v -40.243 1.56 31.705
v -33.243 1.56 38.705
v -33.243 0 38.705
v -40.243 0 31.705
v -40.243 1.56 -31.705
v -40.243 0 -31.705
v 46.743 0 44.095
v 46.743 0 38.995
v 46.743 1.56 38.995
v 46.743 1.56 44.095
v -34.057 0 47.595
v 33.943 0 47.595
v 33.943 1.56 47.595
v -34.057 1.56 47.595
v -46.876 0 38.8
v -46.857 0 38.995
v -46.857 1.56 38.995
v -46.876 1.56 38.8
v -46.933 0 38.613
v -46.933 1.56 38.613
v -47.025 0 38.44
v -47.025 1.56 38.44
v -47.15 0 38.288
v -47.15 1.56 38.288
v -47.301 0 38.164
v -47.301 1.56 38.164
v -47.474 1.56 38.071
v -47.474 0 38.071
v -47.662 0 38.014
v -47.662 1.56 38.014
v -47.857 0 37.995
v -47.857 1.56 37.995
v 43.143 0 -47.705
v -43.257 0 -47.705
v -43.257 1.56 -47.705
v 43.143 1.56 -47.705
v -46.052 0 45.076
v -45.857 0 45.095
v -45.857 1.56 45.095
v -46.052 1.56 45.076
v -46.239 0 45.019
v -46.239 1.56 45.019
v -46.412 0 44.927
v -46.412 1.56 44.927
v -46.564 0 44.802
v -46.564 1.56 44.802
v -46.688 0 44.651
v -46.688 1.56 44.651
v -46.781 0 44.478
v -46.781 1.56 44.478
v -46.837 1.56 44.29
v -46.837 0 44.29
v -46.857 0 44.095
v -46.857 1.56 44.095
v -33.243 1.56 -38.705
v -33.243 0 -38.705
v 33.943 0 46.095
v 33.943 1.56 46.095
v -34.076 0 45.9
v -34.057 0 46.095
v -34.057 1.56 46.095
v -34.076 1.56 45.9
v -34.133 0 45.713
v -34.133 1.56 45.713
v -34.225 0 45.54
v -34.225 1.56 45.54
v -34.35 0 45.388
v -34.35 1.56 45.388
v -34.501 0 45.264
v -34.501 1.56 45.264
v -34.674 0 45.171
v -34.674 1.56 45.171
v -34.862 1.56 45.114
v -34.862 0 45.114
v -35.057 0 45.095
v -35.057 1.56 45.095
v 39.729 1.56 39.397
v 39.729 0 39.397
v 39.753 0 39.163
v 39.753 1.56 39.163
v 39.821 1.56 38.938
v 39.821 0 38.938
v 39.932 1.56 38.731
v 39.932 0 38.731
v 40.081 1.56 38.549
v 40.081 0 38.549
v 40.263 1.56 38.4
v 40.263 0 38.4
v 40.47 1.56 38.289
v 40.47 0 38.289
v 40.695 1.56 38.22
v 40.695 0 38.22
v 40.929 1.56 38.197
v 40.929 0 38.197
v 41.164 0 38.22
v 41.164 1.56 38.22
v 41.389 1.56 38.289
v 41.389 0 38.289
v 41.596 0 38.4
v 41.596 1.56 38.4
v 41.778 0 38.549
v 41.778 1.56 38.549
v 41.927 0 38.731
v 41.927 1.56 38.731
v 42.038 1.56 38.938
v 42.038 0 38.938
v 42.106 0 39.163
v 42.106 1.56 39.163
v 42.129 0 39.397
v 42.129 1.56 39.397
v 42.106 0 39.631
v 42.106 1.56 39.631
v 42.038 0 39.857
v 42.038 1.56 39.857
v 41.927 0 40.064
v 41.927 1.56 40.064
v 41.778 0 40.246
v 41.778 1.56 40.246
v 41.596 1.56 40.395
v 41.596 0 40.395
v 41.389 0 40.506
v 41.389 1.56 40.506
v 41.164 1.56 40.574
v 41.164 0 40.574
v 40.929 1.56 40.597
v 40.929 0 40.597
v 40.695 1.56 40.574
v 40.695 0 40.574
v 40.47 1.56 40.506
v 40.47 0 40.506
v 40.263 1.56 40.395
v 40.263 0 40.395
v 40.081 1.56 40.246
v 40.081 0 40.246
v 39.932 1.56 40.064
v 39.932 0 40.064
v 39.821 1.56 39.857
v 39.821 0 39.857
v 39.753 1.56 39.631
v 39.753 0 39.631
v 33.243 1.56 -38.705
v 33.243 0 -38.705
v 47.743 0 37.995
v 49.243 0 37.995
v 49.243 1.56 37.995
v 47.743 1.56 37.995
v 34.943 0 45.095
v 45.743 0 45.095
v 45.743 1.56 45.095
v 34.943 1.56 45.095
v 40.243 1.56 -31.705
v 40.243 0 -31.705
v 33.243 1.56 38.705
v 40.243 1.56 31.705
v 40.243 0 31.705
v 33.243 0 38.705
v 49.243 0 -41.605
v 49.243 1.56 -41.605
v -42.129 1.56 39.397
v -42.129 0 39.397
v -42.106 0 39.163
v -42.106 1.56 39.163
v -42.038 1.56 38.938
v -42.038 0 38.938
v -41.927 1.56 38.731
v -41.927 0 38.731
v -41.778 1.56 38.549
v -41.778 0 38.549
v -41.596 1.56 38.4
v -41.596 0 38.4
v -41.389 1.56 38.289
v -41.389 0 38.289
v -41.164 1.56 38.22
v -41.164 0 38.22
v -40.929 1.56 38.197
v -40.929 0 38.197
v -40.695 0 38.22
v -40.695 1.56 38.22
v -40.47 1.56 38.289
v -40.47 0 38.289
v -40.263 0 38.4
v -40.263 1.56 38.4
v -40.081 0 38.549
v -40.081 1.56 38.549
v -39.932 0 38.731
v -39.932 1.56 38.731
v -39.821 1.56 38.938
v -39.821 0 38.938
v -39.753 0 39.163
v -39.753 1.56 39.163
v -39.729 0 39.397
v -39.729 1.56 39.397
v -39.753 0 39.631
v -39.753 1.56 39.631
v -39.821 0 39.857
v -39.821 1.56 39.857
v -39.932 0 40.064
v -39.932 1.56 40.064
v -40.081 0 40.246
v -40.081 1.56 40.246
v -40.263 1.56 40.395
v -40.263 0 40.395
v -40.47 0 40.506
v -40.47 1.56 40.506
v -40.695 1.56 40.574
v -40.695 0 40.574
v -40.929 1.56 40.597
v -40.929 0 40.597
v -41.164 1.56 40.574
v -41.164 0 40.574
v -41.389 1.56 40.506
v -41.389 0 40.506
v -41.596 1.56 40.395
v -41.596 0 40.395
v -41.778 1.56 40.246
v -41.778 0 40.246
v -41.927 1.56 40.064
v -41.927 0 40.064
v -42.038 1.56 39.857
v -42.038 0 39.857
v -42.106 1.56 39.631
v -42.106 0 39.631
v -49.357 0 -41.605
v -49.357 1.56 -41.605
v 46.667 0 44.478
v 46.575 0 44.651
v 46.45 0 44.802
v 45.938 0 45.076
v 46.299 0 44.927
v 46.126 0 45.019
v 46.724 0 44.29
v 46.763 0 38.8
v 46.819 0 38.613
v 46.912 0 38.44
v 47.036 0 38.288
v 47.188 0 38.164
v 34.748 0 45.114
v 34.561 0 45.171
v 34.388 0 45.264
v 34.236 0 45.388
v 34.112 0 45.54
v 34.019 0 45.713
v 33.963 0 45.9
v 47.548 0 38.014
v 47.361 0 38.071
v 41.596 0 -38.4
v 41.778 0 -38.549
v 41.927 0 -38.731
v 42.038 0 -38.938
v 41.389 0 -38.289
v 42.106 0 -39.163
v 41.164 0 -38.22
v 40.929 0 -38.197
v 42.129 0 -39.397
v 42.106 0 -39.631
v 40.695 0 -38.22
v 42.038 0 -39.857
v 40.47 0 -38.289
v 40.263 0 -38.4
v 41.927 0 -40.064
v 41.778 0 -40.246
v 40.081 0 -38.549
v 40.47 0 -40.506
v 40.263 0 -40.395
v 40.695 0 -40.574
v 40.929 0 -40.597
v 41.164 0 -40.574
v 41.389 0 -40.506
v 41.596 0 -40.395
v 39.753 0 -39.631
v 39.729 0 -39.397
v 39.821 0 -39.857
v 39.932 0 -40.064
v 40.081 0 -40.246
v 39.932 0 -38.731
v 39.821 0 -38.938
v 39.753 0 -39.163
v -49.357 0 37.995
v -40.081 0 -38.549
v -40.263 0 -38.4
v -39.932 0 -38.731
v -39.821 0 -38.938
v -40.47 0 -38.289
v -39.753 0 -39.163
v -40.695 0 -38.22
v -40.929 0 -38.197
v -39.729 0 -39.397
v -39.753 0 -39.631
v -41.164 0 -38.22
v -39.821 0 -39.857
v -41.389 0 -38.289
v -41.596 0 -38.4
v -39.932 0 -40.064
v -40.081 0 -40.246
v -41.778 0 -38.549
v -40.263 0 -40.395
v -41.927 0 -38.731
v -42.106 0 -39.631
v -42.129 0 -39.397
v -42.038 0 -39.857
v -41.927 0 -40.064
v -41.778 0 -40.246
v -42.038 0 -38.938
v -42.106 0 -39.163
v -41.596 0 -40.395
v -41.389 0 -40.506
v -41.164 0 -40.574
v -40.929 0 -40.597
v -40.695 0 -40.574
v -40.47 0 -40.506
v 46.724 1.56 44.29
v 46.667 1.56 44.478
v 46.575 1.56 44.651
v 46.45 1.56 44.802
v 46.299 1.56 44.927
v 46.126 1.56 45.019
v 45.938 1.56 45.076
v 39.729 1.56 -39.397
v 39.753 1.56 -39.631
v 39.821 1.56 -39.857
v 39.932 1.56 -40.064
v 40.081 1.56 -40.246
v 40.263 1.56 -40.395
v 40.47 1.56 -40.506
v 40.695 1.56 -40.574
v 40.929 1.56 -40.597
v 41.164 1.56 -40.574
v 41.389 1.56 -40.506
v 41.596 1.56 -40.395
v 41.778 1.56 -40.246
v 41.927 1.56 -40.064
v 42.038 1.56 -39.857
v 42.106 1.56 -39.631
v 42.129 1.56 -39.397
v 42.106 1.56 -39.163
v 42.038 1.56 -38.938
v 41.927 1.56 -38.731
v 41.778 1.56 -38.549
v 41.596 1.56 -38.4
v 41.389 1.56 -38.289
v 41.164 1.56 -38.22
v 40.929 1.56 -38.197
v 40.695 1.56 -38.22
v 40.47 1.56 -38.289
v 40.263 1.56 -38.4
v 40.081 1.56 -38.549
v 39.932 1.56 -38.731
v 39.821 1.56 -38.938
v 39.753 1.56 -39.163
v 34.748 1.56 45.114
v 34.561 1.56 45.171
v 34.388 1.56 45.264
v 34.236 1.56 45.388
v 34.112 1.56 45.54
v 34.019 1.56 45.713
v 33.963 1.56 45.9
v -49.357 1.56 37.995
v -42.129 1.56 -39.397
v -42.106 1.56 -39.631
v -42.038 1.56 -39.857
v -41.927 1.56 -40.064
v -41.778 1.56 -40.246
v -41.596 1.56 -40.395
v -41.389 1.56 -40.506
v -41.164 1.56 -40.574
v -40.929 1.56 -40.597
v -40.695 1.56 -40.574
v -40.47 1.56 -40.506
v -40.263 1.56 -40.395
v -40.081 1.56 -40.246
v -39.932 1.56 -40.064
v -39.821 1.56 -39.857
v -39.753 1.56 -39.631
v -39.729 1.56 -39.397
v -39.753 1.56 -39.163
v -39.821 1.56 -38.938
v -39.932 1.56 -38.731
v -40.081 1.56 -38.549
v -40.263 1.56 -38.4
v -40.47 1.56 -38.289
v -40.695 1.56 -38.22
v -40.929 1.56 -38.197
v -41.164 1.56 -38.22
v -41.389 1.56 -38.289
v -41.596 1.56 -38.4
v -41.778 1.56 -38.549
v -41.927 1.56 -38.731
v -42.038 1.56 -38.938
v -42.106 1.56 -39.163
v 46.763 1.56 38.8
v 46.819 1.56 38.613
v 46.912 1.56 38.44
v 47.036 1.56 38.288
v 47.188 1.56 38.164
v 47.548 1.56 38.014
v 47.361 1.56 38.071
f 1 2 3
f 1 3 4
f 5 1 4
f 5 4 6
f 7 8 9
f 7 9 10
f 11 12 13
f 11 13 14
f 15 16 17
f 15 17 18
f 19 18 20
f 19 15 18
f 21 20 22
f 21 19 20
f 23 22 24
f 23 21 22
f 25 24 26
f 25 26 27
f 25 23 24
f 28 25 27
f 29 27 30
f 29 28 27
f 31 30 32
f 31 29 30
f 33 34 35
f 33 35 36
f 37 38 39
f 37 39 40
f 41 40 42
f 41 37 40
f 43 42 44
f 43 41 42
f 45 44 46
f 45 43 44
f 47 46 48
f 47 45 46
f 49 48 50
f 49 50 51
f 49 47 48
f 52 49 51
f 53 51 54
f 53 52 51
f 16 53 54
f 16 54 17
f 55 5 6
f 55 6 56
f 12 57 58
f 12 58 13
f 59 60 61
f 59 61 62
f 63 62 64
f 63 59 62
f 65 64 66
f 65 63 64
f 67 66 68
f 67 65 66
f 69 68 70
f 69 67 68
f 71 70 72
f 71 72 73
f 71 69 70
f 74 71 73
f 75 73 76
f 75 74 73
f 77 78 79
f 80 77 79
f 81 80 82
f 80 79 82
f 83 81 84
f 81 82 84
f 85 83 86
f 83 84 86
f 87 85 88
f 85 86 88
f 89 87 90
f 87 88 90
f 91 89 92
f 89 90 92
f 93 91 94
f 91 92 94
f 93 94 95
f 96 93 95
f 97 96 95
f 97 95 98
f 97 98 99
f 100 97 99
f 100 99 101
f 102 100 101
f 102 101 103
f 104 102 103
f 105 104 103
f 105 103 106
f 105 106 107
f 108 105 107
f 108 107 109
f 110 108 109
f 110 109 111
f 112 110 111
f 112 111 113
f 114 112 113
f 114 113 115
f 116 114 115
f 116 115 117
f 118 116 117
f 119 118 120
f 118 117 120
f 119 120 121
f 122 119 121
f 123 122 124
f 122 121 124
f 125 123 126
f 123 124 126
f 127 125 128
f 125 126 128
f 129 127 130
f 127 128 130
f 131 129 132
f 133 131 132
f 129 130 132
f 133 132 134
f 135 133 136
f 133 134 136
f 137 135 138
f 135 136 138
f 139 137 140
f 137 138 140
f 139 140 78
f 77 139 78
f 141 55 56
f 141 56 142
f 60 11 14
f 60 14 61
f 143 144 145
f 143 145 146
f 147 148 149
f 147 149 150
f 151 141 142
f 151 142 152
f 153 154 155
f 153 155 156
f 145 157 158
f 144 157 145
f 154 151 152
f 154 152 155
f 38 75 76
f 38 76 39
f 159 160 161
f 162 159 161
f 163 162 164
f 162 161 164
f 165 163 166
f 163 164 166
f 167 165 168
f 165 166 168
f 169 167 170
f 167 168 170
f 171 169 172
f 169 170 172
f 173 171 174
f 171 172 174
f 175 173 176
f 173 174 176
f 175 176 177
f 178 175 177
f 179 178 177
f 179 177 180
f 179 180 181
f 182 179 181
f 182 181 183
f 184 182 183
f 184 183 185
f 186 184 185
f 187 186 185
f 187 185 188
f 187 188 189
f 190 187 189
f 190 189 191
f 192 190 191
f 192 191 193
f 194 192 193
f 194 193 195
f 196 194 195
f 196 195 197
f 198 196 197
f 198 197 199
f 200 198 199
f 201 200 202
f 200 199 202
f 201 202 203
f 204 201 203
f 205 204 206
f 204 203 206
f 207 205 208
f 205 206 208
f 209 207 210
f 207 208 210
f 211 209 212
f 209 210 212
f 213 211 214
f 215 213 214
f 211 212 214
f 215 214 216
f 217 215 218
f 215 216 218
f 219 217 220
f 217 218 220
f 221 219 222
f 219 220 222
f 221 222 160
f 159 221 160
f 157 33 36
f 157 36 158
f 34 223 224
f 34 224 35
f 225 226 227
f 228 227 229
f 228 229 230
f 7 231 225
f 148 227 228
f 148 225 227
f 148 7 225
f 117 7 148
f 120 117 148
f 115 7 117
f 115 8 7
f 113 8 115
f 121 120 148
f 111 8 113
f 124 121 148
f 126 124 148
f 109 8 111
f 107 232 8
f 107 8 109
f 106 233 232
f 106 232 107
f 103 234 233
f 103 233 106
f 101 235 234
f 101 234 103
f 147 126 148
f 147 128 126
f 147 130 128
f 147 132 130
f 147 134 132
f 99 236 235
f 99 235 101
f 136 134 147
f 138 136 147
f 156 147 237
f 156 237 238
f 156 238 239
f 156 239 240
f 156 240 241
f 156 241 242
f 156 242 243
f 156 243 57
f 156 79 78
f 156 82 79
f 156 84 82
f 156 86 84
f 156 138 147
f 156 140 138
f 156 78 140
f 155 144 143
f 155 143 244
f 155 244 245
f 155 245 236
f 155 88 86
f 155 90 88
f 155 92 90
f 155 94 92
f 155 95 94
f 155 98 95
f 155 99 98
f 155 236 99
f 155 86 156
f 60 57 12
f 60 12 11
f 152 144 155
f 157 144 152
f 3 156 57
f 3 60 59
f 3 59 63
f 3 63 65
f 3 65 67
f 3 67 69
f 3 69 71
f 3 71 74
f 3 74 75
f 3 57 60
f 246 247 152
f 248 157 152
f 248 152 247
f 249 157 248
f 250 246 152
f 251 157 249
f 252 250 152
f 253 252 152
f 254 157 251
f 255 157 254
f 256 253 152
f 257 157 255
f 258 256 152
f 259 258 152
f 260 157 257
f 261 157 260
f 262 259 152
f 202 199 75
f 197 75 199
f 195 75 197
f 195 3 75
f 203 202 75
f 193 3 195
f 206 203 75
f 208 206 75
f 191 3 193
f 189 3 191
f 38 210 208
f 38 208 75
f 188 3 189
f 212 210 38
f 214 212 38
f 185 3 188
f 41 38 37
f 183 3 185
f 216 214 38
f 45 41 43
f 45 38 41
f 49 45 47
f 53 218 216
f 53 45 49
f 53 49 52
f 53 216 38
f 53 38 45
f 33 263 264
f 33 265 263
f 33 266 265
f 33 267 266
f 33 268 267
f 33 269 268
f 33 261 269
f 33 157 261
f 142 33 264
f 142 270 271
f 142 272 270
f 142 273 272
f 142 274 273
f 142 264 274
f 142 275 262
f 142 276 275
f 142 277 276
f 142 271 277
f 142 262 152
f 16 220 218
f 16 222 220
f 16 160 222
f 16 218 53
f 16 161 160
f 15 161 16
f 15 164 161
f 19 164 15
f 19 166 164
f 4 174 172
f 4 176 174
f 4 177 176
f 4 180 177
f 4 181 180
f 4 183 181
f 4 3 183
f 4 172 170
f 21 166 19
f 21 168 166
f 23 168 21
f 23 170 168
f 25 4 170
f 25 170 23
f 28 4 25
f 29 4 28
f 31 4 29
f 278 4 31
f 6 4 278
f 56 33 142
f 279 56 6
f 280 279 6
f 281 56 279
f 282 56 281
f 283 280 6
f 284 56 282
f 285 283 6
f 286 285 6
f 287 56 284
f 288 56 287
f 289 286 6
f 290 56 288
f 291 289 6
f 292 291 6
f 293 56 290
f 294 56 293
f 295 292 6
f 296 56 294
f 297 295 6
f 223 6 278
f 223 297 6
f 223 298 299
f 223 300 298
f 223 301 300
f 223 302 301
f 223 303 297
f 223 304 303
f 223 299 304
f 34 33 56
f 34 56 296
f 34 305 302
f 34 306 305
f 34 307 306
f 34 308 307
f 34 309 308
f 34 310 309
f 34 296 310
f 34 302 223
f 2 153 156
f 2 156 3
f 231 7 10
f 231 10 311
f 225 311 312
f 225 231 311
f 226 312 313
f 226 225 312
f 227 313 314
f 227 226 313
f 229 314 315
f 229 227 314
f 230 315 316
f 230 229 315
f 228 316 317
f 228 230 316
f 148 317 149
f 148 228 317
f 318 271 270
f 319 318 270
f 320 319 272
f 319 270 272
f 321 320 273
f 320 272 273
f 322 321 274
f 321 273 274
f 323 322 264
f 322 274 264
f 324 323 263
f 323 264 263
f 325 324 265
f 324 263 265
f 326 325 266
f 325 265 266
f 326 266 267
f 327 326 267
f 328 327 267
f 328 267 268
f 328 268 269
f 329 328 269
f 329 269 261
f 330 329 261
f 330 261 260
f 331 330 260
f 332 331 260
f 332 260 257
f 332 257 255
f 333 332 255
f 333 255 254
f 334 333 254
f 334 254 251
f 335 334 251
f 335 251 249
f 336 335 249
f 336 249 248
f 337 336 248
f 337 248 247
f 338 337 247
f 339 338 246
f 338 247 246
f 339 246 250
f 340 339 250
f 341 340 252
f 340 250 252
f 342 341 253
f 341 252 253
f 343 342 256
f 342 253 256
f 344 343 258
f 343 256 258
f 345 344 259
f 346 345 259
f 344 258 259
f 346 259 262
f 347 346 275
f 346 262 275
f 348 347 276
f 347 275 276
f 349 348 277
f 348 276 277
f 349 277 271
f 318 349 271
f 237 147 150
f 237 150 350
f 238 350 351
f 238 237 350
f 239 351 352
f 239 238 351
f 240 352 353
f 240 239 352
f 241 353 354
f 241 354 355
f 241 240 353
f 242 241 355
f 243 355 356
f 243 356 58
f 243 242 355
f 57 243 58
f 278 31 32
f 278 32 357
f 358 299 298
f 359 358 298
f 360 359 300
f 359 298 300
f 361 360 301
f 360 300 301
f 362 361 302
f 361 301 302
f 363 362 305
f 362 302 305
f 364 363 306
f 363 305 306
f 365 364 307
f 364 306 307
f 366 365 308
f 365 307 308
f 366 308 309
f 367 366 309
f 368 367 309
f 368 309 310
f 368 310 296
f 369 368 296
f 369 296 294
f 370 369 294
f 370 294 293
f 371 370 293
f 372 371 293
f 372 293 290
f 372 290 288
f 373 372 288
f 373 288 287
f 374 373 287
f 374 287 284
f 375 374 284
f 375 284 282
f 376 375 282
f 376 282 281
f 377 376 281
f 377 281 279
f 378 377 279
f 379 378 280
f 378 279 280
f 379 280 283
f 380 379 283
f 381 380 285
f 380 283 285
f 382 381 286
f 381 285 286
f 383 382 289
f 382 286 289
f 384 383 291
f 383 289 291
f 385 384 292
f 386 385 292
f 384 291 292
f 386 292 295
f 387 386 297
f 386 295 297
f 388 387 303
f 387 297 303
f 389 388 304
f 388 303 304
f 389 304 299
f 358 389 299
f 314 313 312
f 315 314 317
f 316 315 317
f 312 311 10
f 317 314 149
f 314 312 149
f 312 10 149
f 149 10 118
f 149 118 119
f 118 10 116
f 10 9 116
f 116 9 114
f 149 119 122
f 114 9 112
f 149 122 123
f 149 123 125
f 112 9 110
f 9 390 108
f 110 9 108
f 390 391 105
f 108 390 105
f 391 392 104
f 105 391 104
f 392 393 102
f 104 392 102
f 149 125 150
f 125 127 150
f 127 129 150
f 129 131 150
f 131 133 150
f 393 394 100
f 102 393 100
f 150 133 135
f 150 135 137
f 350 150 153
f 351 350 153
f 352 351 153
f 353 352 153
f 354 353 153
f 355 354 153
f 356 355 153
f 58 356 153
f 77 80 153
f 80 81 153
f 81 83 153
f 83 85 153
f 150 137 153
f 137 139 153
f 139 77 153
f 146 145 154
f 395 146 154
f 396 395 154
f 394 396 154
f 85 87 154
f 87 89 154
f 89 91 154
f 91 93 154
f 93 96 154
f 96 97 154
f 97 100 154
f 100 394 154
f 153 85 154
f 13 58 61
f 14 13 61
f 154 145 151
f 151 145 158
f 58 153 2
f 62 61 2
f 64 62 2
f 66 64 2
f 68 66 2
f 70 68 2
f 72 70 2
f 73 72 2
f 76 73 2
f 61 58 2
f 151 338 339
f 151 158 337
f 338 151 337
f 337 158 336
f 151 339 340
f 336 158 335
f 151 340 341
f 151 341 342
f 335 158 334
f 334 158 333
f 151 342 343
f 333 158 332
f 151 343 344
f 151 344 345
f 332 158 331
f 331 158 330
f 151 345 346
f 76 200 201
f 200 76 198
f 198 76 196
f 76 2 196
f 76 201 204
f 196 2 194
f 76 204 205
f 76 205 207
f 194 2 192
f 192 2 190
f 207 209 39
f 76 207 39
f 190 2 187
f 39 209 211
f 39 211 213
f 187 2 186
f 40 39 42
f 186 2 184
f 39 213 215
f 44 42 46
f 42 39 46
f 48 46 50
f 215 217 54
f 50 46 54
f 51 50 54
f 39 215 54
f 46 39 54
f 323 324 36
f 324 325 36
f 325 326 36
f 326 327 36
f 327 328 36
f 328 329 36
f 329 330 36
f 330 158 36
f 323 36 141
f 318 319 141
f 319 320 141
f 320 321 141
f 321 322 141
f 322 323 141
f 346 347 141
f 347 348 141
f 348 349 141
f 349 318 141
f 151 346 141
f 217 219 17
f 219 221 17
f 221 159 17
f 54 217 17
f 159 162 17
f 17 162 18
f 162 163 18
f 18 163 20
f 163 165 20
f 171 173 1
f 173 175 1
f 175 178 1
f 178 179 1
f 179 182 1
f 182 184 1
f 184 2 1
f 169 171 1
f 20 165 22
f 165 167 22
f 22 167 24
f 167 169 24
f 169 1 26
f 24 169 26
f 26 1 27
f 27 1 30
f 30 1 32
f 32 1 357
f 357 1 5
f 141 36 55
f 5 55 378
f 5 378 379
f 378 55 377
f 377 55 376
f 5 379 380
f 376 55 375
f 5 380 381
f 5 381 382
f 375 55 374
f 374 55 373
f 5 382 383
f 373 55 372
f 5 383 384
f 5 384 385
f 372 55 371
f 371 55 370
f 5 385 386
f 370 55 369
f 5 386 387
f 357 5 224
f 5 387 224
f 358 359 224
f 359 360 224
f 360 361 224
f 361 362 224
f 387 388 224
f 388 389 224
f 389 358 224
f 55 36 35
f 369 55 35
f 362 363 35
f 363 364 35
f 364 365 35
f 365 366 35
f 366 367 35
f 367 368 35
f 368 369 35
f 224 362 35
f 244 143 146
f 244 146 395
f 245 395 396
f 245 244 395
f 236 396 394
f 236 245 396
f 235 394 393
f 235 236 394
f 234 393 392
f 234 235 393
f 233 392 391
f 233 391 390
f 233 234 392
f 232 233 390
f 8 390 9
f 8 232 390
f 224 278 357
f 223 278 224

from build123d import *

# Parameters (mm, degrees)
BOSS_EXTRUDE1_DEPTH      = 1.56
CUT_EXTRUDE1_DEPTH       = 1.56
M2_CLEARANCE_HOLE1_D     = 2.4
M2_CLEARANCE_HOLE1_DEPTH = 38.1
M2_CLEARANCE_HOLE1_TIP   = 0.721032743


with BuildPart() as part:
    # Sketch1 → Boss-Extrude1 (new body)
    with BuildSketch(Plane(origin=(0, 0, 0), x_dir=(1, 0, 0), z_dir=(0, 1, 0))):
        with BuildLine():
            Line((-49.356685196, 41.604788024), (-43.256685196, 47.704788024))
            Line((-43.256685196, 47.704788024), (43.143314804, 47.704788024))
            Line((43.143314804, 47.704788024), (49.243314804, 41.604788024))
            Line((49.243314804, 41.604788024), (49.243314804, -37.995211976))
            Line((49.243314804, -37.995211976), (47.743314804, -37.995211976))
            ThreePointArc((47.743314804, -37.995211976), (47.036208023, -38.288105194), (46.743314804, -38.995211976))
            Line((46.743314804, -38.995211976), (46.743314804, -44.095211976))
            ThreePointArc((46.743314804, -44.095211976), (46.450421585, -44.802318757), (45.743314804, -45.095211976))
            Line((45.743314804, -45.095211976), (34.943314804, -45.095211976))
            ThreePointArc((34.943314804, -45.095211976), (34.236208023, -45.388105194), (33.943314804, -46.095211976))
            Line((33.943314804, -46.095211976), (33.943314804, -47.595211976))
            Line((33.943314804, -47.595211976), (-34.056685196, -47.595211976))
            Line((-34.056685196, -47.595211976), (-34.056685196, -46.095211976))
            ThreePointArc((-34.056685196, -46.095211976), (-34.349578415, -45.388105194), (-35.056685196, -45.095211976))
            Line((-35.056685196, -45.095211976), (-45.856685196, -45.095211976))
            ThreePointArc((-45.856685196, -45.095211976), (-46.563791977, -44.802318757), (-46.856685196, -44.095211976))
            Line((-46.856685196, -44.095211976), (-46.856685196, -38.995211976))
            ThreePointArc((-46.856685196, -38.995211976), (-47.149578415, -38.288105194), (-47.856685196, -37.995211976))
            Line((-47.856685196, -37.995211976), (-49.356685196, -37.995211976))
            Line((-49.356685196, -37.995211976), (-49.356685196, 41.604788024))
        make_face()
    extrude(amount=BOSS_EXTRUDE1_DEPTH)

    # Sketch2 → Cut-Extrude1 (cut)
    with BuildSketch(Plane(origin=(0, 1.56, 0), x_dir=(1, 0, 0), z_dir=(0, 1, 0))):
        Polygon((-40.243314804, 31.704788024), (-33.243314804, 38.704788024), (33.243314804, 38.704788024), (40.243314804, 31.704788024), (40.243314804, -31.704788024), (33.243314804, -38.704788024), (-33.243314804, -38.704788024), (-40.243314804, -31.704788024), align=None)
    extrude(amount=-CUT_EXTRUDE1_DEPTH, mode=Mode.SUBTRACT)

    # M2 Clearance Hole1
    with Locations(Plane(origin=(0, 1.56, 0), x_dir=(1, 0, 0), z_dir=(0, 1, 0))):
        with Locations((40.929491149, 39.39737116), (40.929491149, -39.39737116), (-40.929491149, -39.39737116), (-40.929491149, 39.39737116), (0, 0)):
            Hole(M2_CLEARANCE_HOLE1_D / 2, depth=M2_CLEARANCE_HOLE1_DEPTH)
            with Locations((0, 0, -(M2_CLEARANCE_HOLE1_DEPTH + M2_CLEARANCE_HOLE1_TIP / 2))):  # 118° drill point
                Cone(0, M2_CLEARANCE_HOLE1_D / 2, M2_CLEARANCE_HOLE1_TIP, mode=Mode.SUBTRACT)


solid = part.part
